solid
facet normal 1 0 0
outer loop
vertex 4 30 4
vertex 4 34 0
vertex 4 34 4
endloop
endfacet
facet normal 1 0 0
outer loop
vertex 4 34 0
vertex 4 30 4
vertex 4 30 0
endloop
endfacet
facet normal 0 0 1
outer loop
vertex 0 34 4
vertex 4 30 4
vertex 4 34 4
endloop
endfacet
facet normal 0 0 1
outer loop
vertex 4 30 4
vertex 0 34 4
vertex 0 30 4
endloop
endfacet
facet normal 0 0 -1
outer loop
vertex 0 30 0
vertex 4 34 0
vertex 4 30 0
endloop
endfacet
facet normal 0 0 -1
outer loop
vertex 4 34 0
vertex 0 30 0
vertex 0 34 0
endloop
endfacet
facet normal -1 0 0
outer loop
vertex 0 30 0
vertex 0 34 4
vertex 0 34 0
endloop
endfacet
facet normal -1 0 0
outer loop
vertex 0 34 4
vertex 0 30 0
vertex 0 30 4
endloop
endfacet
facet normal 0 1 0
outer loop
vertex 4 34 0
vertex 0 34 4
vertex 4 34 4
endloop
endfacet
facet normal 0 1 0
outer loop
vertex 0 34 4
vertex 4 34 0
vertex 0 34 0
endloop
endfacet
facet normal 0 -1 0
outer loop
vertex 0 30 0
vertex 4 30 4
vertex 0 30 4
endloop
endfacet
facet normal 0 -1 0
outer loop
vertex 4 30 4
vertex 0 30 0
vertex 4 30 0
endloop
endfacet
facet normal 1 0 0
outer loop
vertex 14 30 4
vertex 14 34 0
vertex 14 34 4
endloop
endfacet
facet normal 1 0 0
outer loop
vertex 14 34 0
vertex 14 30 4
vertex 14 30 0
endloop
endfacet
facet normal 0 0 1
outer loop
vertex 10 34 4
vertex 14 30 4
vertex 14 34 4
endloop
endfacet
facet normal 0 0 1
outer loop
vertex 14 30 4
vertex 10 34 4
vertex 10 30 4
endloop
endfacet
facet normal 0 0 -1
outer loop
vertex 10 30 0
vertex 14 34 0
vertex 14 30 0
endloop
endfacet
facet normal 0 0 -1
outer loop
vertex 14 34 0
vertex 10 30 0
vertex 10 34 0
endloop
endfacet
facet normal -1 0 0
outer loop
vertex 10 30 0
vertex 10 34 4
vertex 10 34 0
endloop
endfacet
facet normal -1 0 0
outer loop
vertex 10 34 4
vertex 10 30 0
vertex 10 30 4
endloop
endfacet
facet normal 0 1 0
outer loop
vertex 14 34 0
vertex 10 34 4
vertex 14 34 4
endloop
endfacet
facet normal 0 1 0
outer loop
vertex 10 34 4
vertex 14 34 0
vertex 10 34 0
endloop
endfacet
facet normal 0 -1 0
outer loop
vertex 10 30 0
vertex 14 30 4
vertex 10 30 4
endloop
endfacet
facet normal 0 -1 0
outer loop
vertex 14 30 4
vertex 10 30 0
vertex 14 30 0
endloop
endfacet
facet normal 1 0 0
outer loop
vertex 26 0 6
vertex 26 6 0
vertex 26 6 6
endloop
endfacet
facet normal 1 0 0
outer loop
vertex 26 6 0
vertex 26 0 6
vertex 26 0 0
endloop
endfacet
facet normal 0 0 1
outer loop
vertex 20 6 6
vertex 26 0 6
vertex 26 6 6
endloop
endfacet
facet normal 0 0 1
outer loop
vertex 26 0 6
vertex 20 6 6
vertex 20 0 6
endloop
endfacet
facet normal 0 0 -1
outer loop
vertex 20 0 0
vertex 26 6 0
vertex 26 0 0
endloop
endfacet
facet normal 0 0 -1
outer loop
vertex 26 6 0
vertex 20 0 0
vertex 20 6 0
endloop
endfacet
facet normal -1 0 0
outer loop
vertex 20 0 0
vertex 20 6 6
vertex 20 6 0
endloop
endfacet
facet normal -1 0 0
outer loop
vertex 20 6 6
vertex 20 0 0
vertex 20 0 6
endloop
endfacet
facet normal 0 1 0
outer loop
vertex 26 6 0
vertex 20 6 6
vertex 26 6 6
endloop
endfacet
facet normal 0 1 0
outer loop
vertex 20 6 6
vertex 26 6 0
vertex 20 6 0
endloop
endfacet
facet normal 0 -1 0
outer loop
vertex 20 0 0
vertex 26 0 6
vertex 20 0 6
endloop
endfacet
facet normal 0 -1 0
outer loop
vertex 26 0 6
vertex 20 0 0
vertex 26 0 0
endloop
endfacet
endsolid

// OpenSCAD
// `children(i)`, `children([a:b])` and an out-of-bounds index. The corpus tested
// only the bare `children()`, which is the one form that cannot be wrong about
// WHICH child it instantiates.
//
// WHAT IT WOULD CATCH. A selector that ignores its argument instantiates the
// children the source did not ask for — extra material, in a mechanism where the
// caller cannot see it, because the selection happens inside somebody's library
// module. An off-by-one in the range form drops or duplicates a whole part. And
// an out-of-bounds index must emit NOTHING and warn, not clamp to the last
// child: clamping turns a source bug into a plausible part.
//
// WHY IT WAS CHOSEN, WITH THE COUNT. `hardware/cad/` calls `children()` with an
// explicit index from 0 to 8 across its library modules. `module_children`
// covers the passthrough case and nothing else, so every indexed form — the ones
// with a number in them to get wrong — had no coverage at all.
//
// ⚠ THE SPHERE IN THE SECOND CALL IS THE ONE THAT MUST NOT APPEAR. `children([0:1])`
// selects the first two children; if the range form ever degrades to "all", the
// sphere arrives and the case reddens on both legs. It is sized and placed so
// that its arrival is unmistakable rather than marginal.
//
// The third call asks for child 5 of 1. OpenSCAD emits nothing and prints
// `WARNING: Children index (5) out of bounds (1 children)`; so does this file,
// in OpenSCAD's own wording, and nothing is drawn for it on either side.
//
// Decidability: the selected solids occupy x[20,26]y[0,6], x[0,4]y[30,34] and
// x[10,14]y[30,34]. No two touch, and the sphere a regression would add is
// centred at (0,30) with r 9, so it would overlap — the case is designed to
// redden on the TREE leg, which it does, before the mesh leg is asked.
//
// PLANTED AND WATCHED RED (throwaway copy, openscad 2026.08.07):
//   · `children(i)` ignoring its index and instantiating all -> DIVERGES
module pick() { children(1); }
pick() { cube([5, 5, 5]); translate([20, 0, 0]) cube([6, 6, 6]); }

module firsttwo() { children([0 : 1]); }
translate([0, 30, 0]) firsttwo() { cube([4, 4, 4]); translate([10, 0, 0]) cube([4, 4, 4]); sphere(r = 9, $fn = 12); }

module oob() { children(5); }
translate([0, 60, 0]) oob() cube([3, 3, 3]);
